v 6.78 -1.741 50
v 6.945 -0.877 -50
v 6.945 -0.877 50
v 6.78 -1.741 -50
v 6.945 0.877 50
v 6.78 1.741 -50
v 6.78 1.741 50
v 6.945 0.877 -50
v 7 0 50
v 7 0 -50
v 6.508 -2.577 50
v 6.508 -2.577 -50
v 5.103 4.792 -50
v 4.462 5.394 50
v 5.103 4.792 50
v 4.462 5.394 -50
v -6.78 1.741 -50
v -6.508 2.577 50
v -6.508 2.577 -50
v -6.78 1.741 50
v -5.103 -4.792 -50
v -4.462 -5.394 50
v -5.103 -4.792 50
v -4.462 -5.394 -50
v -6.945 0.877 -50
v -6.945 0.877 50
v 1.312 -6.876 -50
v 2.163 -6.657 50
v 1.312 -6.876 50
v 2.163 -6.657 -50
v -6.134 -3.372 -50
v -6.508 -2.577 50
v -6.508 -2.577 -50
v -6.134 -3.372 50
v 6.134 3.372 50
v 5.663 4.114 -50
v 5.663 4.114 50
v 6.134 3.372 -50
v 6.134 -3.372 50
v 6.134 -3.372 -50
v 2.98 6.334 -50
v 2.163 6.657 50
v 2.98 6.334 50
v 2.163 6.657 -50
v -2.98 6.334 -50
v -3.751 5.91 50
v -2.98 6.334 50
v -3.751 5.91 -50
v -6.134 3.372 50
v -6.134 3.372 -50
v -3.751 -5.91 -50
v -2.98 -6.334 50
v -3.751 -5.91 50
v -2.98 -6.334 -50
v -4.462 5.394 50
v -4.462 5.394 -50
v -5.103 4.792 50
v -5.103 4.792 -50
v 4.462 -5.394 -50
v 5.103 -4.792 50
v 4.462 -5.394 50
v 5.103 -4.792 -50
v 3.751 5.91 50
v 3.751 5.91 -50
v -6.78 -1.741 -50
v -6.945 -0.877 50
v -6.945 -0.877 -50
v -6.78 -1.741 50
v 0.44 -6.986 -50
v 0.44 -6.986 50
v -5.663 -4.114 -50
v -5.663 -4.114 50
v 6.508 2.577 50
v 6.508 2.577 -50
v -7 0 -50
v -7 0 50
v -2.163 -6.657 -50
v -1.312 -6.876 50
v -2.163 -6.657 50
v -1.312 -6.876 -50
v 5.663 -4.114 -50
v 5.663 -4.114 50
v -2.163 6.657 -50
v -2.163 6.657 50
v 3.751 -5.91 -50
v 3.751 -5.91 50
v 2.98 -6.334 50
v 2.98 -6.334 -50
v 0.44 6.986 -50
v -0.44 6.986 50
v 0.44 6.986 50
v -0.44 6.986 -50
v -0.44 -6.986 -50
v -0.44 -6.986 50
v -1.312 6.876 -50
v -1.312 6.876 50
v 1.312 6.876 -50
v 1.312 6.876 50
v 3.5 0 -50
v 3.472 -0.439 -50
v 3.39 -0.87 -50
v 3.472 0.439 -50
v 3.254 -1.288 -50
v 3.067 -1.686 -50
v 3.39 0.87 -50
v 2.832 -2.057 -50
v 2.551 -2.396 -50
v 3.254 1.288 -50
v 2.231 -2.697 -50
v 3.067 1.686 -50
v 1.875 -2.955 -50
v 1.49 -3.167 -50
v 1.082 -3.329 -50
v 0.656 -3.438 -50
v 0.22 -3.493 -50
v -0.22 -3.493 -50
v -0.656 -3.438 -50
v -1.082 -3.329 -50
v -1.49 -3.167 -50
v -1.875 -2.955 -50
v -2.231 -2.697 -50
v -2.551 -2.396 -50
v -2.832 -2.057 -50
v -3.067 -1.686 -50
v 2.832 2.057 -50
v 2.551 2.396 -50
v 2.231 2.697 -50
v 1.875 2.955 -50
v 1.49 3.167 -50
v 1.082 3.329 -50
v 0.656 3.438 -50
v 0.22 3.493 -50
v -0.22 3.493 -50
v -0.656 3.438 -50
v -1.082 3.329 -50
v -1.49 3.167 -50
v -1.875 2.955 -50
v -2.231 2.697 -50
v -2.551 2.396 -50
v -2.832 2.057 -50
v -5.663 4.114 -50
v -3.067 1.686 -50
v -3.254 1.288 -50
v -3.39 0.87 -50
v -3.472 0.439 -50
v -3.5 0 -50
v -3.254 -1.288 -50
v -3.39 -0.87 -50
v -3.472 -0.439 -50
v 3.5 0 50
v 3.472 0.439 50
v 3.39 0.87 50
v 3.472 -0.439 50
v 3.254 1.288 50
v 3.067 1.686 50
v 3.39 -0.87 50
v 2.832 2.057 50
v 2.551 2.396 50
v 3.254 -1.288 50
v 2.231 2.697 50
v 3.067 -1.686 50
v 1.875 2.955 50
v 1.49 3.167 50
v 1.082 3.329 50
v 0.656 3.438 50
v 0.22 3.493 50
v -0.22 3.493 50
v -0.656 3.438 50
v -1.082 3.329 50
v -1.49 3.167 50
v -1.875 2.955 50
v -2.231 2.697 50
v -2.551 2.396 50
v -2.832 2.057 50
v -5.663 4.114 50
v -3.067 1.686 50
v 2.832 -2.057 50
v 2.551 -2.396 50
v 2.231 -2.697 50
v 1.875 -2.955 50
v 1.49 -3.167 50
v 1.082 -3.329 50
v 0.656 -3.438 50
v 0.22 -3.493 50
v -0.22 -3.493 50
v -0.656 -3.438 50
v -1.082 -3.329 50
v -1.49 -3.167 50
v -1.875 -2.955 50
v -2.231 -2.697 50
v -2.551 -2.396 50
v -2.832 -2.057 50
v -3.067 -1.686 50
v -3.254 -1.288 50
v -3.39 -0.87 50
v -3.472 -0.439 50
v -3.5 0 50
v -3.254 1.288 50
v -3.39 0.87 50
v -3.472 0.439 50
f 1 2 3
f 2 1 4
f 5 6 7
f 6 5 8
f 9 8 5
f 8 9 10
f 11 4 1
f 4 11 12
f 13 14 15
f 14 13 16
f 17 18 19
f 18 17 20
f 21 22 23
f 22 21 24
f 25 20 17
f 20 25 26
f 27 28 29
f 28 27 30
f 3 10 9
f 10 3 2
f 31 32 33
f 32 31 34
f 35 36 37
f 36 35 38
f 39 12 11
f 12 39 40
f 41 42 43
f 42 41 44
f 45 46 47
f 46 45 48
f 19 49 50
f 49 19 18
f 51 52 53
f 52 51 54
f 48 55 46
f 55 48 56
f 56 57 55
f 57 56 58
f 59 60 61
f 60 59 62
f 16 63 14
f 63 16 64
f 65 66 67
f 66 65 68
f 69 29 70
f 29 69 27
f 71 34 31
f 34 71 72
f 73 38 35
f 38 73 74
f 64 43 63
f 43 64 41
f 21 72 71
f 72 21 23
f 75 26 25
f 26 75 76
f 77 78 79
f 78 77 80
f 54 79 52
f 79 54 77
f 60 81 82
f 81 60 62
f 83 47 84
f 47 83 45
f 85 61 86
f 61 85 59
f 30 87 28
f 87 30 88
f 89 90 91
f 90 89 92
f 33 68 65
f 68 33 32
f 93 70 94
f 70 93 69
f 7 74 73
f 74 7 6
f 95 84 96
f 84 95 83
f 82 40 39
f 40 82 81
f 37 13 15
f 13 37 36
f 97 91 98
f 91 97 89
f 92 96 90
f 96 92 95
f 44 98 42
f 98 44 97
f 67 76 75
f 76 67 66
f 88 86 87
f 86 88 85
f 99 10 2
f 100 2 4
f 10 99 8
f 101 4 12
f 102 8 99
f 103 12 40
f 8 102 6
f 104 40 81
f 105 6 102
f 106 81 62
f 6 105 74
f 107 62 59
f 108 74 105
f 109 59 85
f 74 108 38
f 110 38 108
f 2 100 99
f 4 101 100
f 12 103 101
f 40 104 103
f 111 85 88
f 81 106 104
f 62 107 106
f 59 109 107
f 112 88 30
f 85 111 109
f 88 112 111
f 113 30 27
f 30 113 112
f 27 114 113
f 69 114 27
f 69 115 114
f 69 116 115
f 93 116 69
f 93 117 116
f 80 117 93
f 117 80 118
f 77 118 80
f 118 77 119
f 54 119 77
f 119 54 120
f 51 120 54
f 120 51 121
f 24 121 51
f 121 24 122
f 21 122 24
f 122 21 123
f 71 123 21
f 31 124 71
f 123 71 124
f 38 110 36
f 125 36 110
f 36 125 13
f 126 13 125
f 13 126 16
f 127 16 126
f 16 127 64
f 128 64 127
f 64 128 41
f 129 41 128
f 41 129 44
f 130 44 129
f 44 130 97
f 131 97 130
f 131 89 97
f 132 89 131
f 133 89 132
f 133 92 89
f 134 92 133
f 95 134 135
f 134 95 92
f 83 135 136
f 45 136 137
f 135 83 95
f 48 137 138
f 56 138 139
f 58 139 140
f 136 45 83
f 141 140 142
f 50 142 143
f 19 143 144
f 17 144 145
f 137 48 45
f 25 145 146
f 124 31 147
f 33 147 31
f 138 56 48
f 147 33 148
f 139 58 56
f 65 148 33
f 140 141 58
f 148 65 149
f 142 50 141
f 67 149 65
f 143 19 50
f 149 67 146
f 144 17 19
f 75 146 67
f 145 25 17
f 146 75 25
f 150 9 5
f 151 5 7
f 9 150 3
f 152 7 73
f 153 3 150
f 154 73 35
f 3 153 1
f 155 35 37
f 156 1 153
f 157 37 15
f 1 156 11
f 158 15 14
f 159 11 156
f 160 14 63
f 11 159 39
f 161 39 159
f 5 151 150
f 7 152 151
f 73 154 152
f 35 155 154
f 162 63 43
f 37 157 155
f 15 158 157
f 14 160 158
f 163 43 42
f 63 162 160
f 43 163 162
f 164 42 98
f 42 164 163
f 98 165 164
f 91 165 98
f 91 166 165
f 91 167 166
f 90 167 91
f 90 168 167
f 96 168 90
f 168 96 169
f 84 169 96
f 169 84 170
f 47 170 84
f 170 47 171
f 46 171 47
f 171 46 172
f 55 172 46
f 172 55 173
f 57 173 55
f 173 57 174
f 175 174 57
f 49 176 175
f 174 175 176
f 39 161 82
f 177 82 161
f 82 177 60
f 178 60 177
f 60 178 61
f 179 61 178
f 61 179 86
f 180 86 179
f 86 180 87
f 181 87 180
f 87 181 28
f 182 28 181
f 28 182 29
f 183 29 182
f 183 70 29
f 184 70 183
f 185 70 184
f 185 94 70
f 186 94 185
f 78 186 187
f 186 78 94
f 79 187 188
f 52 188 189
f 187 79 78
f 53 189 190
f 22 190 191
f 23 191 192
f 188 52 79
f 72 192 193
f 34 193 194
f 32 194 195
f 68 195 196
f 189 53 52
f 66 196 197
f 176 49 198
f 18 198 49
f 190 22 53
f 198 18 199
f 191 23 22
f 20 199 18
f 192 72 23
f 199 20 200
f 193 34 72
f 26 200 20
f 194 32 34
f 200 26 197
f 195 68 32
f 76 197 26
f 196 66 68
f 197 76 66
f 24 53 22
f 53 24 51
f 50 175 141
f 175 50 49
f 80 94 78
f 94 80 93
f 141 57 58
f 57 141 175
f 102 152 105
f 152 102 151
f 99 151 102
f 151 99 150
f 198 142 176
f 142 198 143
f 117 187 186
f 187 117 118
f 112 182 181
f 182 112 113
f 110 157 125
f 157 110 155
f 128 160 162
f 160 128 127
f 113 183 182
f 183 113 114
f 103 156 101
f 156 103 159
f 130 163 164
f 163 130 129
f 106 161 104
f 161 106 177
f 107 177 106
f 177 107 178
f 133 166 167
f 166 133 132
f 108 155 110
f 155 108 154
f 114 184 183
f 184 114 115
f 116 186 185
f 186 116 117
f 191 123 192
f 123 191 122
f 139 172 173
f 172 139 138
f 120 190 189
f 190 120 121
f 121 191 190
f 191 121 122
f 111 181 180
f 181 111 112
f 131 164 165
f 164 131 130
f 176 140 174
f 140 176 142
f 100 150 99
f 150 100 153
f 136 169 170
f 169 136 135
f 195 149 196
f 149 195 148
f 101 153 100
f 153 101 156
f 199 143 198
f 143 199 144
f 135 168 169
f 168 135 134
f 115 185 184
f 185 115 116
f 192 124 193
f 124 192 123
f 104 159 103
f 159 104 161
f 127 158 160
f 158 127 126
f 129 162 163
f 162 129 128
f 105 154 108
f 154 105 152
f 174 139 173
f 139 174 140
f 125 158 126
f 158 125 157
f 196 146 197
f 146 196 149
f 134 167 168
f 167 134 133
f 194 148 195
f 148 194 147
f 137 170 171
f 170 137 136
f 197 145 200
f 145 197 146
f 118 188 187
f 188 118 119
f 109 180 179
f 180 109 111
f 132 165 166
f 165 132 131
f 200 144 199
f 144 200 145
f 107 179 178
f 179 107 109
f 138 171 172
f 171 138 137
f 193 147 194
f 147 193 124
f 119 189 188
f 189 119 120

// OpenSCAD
$fn = 50;


difference() {
	union() {
		translate(v = [0, 0, -50.0000000000]) {
			cylinder(h = 100, r = 7.0000000000);
		}
	}
	union() {
		translate(v = [0, 0, -100.0000000000]) {
			cylinder(h = 200, r = 3.5000000000);
		}
	}
}
